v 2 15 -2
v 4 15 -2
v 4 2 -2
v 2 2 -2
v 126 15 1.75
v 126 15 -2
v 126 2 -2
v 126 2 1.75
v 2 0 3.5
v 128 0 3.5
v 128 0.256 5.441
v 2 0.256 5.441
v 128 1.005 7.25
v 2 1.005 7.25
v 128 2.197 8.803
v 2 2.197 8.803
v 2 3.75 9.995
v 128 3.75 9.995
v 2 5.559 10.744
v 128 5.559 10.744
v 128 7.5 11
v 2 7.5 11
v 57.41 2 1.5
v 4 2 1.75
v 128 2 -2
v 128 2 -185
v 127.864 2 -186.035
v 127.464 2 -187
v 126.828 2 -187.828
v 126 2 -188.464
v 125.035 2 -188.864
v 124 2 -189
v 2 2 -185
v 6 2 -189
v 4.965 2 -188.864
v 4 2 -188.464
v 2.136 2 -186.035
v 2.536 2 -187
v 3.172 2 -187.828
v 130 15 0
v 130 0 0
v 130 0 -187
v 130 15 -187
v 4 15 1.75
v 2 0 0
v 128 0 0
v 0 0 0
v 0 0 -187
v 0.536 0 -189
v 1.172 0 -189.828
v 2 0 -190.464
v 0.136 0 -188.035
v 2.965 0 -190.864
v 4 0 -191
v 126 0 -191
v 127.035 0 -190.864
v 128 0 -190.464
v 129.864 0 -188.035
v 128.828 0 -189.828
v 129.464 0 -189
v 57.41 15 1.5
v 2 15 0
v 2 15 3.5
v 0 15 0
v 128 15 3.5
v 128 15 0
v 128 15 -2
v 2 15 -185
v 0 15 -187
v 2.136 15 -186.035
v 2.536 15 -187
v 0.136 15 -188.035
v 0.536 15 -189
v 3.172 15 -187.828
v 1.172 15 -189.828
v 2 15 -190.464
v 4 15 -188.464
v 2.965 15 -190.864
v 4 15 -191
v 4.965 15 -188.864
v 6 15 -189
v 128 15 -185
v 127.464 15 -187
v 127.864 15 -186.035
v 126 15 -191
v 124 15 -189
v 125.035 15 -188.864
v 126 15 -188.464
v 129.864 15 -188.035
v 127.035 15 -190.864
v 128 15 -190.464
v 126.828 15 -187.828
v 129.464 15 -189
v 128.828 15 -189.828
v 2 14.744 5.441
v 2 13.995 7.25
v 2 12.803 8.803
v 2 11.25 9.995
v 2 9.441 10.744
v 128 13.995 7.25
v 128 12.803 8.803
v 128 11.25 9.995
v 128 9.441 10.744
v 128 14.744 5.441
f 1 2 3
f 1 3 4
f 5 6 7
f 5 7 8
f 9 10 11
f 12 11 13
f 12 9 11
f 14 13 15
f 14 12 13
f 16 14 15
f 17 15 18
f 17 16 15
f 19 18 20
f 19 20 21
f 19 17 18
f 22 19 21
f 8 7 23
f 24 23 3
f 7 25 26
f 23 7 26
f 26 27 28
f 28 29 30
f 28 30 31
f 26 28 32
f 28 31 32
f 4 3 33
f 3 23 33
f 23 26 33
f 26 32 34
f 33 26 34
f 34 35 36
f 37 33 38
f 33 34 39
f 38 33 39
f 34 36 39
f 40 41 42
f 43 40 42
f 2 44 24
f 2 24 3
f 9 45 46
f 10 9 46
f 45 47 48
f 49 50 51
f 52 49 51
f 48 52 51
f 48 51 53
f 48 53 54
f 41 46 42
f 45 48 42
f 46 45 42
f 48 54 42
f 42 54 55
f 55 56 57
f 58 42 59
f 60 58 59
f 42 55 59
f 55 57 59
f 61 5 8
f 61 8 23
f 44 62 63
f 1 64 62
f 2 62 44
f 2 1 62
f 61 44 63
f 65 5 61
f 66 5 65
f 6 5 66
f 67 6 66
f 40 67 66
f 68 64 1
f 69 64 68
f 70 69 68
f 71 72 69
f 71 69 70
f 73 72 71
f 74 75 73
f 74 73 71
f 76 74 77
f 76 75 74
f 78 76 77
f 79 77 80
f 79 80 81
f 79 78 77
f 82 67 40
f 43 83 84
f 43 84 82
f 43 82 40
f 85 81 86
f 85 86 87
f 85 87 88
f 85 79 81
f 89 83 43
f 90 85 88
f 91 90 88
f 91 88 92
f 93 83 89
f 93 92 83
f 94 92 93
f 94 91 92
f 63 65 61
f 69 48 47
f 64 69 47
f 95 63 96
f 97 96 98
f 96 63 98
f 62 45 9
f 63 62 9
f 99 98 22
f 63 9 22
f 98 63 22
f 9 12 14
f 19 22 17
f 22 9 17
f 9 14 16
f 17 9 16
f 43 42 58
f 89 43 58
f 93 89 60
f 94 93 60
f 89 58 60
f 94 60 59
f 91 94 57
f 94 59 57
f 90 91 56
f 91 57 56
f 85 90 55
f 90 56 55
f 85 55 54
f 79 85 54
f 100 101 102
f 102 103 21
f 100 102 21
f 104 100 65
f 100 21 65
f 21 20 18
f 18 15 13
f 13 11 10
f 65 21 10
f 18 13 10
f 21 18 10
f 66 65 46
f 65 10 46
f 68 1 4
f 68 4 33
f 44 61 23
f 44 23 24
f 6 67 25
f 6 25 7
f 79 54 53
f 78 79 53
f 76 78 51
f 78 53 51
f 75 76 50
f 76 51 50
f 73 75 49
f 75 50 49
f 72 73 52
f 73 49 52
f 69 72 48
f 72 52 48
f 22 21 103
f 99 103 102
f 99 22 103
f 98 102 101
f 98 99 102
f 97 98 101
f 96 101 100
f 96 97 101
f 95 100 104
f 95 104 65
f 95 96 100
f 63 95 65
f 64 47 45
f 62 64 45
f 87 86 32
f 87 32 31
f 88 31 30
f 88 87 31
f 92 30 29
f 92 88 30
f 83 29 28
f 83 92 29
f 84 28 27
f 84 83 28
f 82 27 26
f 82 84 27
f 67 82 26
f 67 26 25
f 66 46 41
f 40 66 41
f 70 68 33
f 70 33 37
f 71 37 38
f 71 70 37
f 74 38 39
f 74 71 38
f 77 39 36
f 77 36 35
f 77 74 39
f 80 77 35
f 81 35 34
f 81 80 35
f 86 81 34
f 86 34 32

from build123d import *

# Parameters (mm, degrees)
SALIENTE_EXTRUIR2_DEPTH = 15
CORTAR_EXTRUIR5_START   = -126
CORTAR_EXTRUIR5_DEPTH   = 126
CORTAR_EXTRUIR6_DEPTH   = 13


# Read off the part's stored shape, not the designer's step: Cortar-Extruir5
with BuildPart() as part:
    # Croquis1 → Saliente-Extruir2 (new body)
    with BuildSketch(Plane(origin=(0, 0, 0), x_dir=(1, 0, 0), z_dir=(0, 1, 0))):
        with BuildLine():
            Line((0, 0), (2, 0))
            Line((2, 0), (2, -11))
            Line((2, -11), (128, -11))
            Line((128, -11), (128, 0))
            Line((128, 0), (130, 0))
            Line((130, 0), (130, 187))
            ThreePointArc((130, 187), (128.828427125, 189.828427125), (126, 191))
            Line((126, 191), (4, 191))
            ThreePointArc((4, 191), (1.171572875, 189.828427125), (0, 187))
            Line((0, 187), (0, 0))
        make_face()
    extrude(amount=SALIENTE_EXTRUIR2_DEPTH)

    # Cortar-Extruir5 outline → Cortar-Extruir5 (cut)
    with BuildSketch(Plane(origin=(128, 0, 0), x_dir=(0, 0, -1), z_dir=(1, 0, 0)).offset(CORTAR_EXTRUIR5_START)):
        with BuildLine():
            Line((-11, 0), (-3.5, 0))
            ThreePointArc((-3.5, 0), (-8.803300859, 2.196699141), (-11, 7.5))
            Line((-11, 7.5), (-11, 0))
        make_face()
        with BuildLine():
            Line((-11, 15), (-11, 7.5))
            ThreePointArc((-11, 7.5), (-8.803300859, 12.803300859), (-3.5, 15))
            Line((-3.5, 15), (-11, 15))
        make_face()
    extrude(amount=CORTAR_EXTRUIR5_DEPTH, mode=Mode.SUBTRACT)

    # Croquis3 → Cortar-Extruir6 (cut)
    with BuildSketch(Plane(origin=(0, 15, 0), x_dir=(1, 0, 0), z_dir=(0, 1, 0))):
        with BuildLine():
            Line((2, 80.037921952), (2, 185))
            ThreePointArc((2, 185), (3.171572875, 187.828427125), (6, 189))
            Line((6, 189), (124, 189))
            ThreePointArc((124, 189), (126.828427125, 187.828427125), (128, 185))
            Line((128, 185), (128, 95.850744251))
            Line((128, 95.850744251), (128, 2))
            Line((128, 2), (126, 2))
            Line((126, 2), (126, -1.75))
            Line((126, -1.75), (57.409845297, -1.5))
            Line((57.409845297, -1.5), (4, -1.75))
            Line((4, -1.75), (4, 2))
            Line((4, 2), (2, 2))
            Line((2, 2), (2, 80.037921952))
        make_face()
    extrude(amount=-CORTAR_EXTRUIR6_DEPTH, mode=Mode.SUBTRACT)


solid = part.part
